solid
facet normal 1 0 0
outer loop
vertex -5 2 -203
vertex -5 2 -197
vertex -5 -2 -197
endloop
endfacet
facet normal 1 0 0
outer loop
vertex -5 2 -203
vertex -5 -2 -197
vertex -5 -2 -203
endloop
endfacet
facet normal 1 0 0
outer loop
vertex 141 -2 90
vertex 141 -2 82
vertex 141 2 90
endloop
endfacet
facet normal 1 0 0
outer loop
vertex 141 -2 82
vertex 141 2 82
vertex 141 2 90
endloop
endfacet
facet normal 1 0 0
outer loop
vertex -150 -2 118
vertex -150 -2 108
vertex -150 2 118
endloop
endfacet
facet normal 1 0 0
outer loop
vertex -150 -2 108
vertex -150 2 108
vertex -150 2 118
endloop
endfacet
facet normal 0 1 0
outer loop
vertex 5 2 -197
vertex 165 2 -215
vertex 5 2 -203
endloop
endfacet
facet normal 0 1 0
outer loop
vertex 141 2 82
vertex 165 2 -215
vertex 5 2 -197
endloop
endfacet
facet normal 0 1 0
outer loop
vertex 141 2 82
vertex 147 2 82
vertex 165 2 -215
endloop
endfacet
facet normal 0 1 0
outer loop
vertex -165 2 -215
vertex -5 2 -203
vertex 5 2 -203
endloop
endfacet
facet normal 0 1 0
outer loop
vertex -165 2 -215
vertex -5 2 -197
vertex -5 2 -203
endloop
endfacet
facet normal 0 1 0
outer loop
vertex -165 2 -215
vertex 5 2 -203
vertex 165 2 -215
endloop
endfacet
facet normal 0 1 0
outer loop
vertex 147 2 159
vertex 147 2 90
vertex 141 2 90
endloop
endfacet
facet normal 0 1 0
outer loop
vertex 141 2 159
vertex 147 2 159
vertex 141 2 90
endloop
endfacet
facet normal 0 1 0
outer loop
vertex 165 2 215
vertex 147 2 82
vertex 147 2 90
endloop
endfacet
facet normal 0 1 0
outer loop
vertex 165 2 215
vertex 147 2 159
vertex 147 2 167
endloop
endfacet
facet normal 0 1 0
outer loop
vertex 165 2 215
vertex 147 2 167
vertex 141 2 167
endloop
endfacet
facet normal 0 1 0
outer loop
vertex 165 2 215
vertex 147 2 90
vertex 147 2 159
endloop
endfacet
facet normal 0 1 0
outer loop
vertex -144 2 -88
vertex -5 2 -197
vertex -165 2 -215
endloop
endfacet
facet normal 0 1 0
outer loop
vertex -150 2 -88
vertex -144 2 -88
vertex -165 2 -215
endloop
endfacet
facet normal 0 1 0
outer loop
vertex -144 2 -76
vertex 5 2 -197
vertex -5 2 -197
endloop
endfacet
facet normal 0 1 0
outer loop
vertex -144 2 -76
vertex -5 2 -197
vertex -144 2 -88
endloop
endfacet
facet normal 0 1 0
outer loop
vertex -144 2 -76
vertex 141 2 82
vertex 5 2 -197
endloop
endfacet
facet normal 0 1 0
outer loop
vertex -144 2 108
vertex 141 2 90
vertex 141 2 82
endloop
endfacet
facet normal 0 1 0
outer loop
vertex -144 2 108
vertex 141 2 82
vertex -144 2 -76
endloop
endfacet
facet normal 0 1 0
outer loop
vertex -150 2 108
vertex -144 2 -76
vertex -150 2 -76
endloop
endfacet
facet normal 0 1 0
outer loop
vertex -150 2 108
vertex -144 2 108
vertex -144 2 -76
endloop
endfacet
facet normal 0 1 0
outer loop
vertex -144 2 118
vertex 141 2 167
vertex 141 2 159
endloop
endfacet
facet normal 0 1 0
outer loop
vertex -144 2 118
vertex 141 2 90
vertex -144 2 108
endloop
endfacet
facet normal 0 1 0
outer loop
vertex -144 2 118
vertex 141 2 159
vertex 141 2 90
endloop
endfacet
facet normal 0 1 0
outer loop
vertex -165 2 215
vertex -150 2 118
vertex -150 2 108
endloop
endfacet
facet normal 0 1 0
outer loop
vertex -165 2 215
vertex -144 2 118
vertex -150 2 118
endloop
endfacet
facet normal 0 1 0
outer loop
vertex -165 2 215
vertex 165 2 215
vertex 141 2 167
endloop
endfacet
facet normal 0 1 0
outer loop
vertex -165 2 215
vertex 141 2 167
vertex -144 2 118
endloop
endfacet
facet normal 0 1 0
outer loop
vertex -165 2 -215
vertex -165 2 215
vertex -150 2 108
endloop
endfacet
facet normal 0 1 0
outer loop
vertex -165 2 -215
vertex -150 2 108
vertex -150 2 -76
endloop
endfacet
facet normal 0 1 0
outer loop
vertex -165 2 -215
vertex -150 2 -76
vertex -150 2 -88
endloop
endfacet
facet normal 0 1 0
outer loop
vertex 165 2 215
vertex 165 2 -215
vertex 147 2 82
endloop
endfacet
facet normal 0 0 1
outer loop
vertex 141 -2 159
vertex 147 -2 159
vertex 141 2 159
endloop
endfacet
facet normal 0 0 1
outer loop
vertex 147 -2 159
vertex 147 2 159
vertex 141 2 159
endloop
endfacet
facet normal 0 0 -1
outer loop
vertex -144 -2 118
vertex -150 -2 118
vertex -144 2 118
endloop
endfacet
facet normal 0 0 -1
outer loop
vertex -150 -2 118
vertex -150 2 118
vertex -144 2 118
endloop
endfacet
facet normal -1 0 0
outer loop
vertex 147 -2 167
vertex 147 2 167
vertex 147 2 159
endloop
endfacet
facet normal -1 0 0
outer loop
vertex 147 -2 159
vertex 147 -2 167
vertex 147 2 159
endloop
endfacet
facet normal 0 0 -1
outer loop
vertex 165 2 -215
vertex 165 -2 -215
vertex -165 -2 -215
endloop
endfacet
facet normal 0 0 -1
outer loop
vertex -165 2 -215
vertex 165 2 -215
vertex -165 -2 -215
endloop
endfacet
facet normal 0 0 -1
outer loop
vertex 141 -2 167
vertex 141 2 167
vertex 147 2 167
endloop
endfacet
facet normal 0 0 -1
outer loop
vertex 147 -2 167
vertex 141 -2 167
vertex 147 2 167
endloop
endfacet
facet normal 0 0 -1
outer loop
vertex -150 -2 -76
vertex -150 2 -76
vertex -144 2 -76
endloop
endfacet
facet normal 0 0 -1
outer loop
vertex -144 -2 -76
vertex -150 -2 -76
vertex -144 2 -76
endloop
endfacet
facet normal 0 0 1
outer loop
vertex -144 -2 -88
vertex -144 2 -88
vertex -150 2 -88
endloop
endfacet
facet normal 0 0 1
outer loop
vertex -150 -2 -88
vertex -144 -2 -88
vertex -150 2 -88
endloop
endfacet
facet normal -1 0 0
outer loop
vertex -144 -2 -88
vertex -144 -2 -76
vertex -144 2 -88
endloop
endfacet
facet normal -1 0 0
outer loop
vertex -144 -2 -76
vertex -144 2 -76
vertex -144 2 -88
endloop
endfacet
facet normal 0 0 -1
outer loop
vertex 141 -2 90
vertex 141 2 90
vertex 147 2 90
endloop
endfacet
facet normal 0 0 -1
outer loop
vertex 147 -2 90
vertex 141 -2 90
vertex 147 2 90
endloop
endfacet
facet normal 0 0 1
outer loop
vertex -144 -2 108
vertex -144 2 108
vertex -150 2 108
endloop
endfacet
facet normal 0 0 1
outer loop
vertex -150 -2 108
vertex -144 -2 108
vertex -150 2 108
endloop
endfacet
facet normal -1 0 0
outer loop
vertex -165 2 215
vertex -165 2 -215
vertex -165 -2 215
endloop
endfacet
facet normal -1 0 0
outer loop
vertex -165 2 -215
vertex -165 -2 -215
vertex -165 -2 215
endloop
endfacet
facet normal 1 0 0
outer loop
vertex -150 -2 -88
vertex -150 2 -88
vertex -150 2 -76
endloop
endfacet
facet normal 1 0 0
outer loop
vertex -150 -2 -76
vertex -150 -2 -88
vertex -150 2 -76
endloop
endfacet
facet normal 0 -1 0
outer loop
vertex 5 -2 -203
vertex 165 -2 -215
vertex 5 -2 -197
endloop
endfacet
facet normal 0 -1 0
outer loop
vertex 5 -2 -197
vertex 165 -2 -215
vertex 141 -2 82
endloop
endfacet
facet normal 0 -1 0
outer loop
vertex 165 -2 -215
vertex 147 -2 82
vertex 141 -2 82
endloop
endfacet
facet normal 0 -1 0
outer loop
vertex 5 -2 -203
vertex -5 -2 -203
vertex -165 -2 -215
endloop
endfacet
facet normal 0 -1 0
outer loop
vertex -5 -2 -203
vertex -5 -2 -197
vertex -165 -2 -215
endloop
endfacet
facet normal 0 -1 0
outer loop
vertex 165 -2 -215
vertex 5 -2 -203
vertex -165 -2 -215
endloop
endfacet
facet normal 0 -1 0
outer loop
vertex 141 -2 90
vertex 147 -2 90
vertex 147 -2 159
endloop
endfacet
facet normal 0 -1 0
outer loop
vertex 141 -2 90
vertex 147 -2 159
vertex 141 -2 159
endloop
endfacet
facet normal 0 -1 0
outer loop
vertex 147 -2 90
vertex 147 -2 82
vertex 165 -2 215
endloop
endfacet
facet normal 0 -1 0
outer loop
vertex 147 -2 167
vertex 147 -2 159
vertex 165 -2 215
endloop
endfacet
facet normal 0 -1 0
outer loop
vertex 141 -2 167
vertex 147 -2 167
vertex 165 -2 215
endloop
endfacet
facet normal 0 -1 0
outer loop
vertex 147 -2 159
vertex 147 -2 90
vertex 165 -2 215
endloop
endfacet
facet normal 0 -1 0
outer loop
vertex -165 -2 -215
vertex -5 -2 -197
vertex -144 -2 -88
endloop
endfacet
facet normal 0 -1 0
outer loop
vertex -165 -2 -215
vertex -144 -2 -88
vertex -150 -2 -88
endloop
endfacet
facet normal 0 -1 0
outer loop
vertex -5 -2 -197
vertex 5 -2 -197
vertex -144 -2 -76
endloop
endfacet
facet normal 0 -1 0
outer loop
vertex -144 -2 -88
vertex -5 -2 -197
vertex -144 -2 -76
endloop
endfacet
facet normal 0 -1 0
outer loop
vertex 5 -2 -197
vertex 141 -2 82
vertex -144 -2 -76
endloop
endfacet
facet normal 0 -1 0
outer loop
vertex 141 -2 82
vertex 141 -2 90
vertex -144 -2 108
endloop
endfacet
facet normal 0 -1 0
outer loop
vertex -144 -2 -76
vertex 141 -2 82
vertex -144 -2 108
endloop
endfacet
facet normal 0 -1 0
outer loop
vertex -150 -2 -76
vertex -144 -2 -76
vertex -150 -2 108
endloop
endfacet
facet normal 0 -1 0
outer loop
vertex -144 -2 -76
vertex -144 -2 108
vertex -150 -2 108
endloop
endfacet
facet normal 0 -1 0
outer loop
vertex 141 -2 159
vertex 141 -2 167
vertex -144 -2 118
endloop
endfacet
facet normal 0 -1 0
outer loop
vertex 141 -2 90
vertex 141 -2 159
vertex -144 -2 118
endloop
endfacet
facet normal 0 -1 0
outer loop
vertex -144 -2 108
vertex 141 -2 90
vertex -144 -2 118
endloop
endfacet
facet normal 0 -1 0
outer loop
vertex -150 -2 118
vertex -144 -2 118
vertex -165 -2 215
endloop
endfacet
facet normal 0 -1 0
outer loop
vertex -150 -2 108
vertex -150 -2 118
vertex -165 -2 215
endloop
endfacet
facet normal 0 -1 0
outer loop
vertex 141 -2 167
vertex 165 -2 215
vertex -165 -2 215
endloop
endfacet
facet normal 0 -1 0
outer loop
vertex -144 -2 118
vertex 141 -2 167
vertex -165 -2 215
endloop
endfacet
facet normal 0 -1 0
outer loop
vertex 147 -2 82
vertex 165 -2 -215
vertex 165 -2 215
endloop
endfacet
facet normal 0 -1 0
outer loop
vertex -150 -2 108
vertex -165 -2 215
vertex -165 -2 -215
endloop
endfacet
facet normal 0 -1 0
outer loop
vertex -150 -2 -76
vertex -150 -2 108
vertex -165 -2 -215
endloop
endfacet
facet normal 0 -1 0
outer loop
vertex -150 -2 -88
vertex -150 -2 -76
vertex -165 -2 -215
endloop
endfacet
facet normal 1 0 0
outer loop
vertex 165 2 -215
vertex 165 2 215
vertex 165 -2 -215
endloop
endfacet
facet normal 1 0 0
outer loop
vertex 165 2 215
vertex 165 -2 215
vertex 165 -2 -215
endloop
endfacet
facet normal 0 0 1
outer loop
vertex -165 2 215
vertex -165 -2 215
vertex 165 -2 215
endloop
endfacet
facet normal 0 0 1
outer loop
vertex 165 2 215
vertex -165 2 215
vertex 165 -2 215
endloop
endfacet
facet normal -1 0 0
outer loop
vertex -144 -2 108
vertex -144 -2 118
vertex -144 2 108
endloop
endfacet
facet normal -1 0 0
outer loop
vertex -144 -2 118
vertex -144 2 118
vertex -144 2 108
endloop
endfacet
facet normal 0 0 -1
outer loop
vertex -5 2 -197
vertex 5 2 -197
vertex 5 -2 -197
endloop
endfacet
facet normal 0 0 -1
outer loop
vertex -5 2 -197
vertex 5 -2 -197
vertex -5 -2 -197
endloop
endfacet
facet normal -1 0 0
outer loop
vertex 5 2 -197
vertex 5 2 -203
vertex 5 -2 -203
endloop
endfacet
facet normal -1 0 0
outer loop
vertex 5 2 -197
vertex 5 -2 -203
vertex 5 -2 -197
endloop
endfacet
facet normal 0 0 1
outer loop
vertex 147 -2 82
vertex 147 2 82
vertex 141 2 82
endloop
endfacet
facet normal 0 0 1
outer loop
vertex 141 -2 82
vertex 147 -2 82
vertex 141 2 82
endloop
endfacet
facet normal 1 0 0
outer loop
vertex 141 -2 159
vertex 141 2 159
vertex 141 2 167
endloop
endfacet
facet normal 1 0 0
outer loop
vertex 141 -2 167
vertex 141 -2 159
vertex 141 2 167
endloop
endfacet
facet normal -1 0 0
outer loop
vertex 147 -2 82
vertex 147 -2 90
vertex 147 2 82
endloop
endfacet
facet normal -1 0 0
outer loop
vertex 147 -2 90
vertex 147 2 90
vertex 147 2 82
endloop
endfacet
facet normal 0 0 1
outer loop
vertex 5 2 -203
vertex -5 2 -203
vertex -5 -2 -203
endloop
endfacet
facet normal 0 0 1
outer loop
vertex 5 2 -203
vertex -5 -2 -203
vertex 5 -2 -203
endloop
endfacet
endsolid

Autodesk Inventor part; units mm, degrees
ref_plane "YZ Plane" through (0, 0, 0) normal (1, 0, 0) x (0, 1, 0)
ref_plane "XZ Plane" through (0, 0, 0) normal (0, 1, 0) x (-1, 0, 0)
ref_plane "XY Plane" through (0, 0, 0) normal (0, 0, 1) x (1, 0, 0)
sketch "Szkic1" plane through (0, 0, 0) normal (0, 1, 0) x (-1, 0, 0)
  line L0 (-165, -215) -> (165, -215)
  line L1 (165, -215) -> (165, 215)
  line L2 (165, 215) -> (-165, 215)
  line L3 (-165, 215) -> (-165, -215)
  line L4 (-165, -215) -> (165, 215) construction
  line L5 (165, -215) -> (-165, 215) construction
  point P0 (0, 0)
  dimension "d0" = 330
  dimension "d1" = 430
extrude "Wyciągnięcie proste1" add sketch "Szkic1" along normal mid plane 4
sketch "Szkic2" plane through (0, 2, 0) normal (0, 1, 0) x (1, 0, 0)
  line L0 (165, -215) -> (165, 215) projected
  line L1 (-165, -215) -> (165, -215) projected
  line L2 (165, 215) -> (-165, 215) projected
  line L3 (147, -159) -> (141, -159)
  line L4 (141, -159) -> (141, -167)
  line L5 (141, -167) -> (147, -167)
  line L6 (147, -167) -> (147, -159)
  line L7 (147, -82) -> (141, -82)
  line L8 (141, -82) -> (141, -90)
  line L9 (141, -90) -> (147, -90)
  line L10 (147, -90) -> (147, -82)
  line L11 (-165, 215) -> (-165, -215) projected
  line L12 (-150, -118) -> (-144, -118)
  line L13 (-144, -118) -> (-144, -108)
  line L14 (-144, -108) -> (-150, -108)
  line L15 (-150, -108) -> (-150, -118)
  line L16 (-150, 76) -> (-144, 76)
  line L17 (-144, 76) -> (-144, 88)
  line L18 (-144, 88) -> (-150, 88)
  line L19 (-150, 88) -> (-150, 76)
  line L20 (5, 197) -> (-5, 197)
  line L21 (-5, 197) -> (-5, 203)
  line L22 (-5, 203) -> (5, 203)
  line L23 (5, 203) -> (5, 197)
  point P0 (0, 0)
  dimension "d39" = 48
  dimension "d40" = 6
  dimension "d41" = 18
  dimension "d42" = 8
  dimension "d43" = 125
  dimension "d44" = 8
  dimension "d45" = 18
  dimension "d46" = 6
  dimension "d59" = 6
  dimension "d60" = 10
  dimension "d61" = 15
  dimension "d62" = 97
  dimension "d65" = 6
  dimension "d66" = 12
  dimension "d67" = 15
  dimension "d68" = 127
  dimension "d71" = 12
  dimension "d72" = 6
  dimension "d73" = 160
  dimension "d74" = 10
extrude "Wyciągnięcie proste7" cut sketch "Szkic2" against normal through all contours L6 L5 L4 L3 | L10 L9 L8 L7 | L15 L14 L13 L12
extrude "Wyciągnięcie proste8" cut sketch "Szkic2" against normal through all contours L19 L18 L17 L16
extrude "Wyciągnięcie proste9" cut sketch "Szkic2" against normal through all contours L20 L21 L22 L23
properties part number "MainFloorPanel" material "Drewno (wiśnia)"
